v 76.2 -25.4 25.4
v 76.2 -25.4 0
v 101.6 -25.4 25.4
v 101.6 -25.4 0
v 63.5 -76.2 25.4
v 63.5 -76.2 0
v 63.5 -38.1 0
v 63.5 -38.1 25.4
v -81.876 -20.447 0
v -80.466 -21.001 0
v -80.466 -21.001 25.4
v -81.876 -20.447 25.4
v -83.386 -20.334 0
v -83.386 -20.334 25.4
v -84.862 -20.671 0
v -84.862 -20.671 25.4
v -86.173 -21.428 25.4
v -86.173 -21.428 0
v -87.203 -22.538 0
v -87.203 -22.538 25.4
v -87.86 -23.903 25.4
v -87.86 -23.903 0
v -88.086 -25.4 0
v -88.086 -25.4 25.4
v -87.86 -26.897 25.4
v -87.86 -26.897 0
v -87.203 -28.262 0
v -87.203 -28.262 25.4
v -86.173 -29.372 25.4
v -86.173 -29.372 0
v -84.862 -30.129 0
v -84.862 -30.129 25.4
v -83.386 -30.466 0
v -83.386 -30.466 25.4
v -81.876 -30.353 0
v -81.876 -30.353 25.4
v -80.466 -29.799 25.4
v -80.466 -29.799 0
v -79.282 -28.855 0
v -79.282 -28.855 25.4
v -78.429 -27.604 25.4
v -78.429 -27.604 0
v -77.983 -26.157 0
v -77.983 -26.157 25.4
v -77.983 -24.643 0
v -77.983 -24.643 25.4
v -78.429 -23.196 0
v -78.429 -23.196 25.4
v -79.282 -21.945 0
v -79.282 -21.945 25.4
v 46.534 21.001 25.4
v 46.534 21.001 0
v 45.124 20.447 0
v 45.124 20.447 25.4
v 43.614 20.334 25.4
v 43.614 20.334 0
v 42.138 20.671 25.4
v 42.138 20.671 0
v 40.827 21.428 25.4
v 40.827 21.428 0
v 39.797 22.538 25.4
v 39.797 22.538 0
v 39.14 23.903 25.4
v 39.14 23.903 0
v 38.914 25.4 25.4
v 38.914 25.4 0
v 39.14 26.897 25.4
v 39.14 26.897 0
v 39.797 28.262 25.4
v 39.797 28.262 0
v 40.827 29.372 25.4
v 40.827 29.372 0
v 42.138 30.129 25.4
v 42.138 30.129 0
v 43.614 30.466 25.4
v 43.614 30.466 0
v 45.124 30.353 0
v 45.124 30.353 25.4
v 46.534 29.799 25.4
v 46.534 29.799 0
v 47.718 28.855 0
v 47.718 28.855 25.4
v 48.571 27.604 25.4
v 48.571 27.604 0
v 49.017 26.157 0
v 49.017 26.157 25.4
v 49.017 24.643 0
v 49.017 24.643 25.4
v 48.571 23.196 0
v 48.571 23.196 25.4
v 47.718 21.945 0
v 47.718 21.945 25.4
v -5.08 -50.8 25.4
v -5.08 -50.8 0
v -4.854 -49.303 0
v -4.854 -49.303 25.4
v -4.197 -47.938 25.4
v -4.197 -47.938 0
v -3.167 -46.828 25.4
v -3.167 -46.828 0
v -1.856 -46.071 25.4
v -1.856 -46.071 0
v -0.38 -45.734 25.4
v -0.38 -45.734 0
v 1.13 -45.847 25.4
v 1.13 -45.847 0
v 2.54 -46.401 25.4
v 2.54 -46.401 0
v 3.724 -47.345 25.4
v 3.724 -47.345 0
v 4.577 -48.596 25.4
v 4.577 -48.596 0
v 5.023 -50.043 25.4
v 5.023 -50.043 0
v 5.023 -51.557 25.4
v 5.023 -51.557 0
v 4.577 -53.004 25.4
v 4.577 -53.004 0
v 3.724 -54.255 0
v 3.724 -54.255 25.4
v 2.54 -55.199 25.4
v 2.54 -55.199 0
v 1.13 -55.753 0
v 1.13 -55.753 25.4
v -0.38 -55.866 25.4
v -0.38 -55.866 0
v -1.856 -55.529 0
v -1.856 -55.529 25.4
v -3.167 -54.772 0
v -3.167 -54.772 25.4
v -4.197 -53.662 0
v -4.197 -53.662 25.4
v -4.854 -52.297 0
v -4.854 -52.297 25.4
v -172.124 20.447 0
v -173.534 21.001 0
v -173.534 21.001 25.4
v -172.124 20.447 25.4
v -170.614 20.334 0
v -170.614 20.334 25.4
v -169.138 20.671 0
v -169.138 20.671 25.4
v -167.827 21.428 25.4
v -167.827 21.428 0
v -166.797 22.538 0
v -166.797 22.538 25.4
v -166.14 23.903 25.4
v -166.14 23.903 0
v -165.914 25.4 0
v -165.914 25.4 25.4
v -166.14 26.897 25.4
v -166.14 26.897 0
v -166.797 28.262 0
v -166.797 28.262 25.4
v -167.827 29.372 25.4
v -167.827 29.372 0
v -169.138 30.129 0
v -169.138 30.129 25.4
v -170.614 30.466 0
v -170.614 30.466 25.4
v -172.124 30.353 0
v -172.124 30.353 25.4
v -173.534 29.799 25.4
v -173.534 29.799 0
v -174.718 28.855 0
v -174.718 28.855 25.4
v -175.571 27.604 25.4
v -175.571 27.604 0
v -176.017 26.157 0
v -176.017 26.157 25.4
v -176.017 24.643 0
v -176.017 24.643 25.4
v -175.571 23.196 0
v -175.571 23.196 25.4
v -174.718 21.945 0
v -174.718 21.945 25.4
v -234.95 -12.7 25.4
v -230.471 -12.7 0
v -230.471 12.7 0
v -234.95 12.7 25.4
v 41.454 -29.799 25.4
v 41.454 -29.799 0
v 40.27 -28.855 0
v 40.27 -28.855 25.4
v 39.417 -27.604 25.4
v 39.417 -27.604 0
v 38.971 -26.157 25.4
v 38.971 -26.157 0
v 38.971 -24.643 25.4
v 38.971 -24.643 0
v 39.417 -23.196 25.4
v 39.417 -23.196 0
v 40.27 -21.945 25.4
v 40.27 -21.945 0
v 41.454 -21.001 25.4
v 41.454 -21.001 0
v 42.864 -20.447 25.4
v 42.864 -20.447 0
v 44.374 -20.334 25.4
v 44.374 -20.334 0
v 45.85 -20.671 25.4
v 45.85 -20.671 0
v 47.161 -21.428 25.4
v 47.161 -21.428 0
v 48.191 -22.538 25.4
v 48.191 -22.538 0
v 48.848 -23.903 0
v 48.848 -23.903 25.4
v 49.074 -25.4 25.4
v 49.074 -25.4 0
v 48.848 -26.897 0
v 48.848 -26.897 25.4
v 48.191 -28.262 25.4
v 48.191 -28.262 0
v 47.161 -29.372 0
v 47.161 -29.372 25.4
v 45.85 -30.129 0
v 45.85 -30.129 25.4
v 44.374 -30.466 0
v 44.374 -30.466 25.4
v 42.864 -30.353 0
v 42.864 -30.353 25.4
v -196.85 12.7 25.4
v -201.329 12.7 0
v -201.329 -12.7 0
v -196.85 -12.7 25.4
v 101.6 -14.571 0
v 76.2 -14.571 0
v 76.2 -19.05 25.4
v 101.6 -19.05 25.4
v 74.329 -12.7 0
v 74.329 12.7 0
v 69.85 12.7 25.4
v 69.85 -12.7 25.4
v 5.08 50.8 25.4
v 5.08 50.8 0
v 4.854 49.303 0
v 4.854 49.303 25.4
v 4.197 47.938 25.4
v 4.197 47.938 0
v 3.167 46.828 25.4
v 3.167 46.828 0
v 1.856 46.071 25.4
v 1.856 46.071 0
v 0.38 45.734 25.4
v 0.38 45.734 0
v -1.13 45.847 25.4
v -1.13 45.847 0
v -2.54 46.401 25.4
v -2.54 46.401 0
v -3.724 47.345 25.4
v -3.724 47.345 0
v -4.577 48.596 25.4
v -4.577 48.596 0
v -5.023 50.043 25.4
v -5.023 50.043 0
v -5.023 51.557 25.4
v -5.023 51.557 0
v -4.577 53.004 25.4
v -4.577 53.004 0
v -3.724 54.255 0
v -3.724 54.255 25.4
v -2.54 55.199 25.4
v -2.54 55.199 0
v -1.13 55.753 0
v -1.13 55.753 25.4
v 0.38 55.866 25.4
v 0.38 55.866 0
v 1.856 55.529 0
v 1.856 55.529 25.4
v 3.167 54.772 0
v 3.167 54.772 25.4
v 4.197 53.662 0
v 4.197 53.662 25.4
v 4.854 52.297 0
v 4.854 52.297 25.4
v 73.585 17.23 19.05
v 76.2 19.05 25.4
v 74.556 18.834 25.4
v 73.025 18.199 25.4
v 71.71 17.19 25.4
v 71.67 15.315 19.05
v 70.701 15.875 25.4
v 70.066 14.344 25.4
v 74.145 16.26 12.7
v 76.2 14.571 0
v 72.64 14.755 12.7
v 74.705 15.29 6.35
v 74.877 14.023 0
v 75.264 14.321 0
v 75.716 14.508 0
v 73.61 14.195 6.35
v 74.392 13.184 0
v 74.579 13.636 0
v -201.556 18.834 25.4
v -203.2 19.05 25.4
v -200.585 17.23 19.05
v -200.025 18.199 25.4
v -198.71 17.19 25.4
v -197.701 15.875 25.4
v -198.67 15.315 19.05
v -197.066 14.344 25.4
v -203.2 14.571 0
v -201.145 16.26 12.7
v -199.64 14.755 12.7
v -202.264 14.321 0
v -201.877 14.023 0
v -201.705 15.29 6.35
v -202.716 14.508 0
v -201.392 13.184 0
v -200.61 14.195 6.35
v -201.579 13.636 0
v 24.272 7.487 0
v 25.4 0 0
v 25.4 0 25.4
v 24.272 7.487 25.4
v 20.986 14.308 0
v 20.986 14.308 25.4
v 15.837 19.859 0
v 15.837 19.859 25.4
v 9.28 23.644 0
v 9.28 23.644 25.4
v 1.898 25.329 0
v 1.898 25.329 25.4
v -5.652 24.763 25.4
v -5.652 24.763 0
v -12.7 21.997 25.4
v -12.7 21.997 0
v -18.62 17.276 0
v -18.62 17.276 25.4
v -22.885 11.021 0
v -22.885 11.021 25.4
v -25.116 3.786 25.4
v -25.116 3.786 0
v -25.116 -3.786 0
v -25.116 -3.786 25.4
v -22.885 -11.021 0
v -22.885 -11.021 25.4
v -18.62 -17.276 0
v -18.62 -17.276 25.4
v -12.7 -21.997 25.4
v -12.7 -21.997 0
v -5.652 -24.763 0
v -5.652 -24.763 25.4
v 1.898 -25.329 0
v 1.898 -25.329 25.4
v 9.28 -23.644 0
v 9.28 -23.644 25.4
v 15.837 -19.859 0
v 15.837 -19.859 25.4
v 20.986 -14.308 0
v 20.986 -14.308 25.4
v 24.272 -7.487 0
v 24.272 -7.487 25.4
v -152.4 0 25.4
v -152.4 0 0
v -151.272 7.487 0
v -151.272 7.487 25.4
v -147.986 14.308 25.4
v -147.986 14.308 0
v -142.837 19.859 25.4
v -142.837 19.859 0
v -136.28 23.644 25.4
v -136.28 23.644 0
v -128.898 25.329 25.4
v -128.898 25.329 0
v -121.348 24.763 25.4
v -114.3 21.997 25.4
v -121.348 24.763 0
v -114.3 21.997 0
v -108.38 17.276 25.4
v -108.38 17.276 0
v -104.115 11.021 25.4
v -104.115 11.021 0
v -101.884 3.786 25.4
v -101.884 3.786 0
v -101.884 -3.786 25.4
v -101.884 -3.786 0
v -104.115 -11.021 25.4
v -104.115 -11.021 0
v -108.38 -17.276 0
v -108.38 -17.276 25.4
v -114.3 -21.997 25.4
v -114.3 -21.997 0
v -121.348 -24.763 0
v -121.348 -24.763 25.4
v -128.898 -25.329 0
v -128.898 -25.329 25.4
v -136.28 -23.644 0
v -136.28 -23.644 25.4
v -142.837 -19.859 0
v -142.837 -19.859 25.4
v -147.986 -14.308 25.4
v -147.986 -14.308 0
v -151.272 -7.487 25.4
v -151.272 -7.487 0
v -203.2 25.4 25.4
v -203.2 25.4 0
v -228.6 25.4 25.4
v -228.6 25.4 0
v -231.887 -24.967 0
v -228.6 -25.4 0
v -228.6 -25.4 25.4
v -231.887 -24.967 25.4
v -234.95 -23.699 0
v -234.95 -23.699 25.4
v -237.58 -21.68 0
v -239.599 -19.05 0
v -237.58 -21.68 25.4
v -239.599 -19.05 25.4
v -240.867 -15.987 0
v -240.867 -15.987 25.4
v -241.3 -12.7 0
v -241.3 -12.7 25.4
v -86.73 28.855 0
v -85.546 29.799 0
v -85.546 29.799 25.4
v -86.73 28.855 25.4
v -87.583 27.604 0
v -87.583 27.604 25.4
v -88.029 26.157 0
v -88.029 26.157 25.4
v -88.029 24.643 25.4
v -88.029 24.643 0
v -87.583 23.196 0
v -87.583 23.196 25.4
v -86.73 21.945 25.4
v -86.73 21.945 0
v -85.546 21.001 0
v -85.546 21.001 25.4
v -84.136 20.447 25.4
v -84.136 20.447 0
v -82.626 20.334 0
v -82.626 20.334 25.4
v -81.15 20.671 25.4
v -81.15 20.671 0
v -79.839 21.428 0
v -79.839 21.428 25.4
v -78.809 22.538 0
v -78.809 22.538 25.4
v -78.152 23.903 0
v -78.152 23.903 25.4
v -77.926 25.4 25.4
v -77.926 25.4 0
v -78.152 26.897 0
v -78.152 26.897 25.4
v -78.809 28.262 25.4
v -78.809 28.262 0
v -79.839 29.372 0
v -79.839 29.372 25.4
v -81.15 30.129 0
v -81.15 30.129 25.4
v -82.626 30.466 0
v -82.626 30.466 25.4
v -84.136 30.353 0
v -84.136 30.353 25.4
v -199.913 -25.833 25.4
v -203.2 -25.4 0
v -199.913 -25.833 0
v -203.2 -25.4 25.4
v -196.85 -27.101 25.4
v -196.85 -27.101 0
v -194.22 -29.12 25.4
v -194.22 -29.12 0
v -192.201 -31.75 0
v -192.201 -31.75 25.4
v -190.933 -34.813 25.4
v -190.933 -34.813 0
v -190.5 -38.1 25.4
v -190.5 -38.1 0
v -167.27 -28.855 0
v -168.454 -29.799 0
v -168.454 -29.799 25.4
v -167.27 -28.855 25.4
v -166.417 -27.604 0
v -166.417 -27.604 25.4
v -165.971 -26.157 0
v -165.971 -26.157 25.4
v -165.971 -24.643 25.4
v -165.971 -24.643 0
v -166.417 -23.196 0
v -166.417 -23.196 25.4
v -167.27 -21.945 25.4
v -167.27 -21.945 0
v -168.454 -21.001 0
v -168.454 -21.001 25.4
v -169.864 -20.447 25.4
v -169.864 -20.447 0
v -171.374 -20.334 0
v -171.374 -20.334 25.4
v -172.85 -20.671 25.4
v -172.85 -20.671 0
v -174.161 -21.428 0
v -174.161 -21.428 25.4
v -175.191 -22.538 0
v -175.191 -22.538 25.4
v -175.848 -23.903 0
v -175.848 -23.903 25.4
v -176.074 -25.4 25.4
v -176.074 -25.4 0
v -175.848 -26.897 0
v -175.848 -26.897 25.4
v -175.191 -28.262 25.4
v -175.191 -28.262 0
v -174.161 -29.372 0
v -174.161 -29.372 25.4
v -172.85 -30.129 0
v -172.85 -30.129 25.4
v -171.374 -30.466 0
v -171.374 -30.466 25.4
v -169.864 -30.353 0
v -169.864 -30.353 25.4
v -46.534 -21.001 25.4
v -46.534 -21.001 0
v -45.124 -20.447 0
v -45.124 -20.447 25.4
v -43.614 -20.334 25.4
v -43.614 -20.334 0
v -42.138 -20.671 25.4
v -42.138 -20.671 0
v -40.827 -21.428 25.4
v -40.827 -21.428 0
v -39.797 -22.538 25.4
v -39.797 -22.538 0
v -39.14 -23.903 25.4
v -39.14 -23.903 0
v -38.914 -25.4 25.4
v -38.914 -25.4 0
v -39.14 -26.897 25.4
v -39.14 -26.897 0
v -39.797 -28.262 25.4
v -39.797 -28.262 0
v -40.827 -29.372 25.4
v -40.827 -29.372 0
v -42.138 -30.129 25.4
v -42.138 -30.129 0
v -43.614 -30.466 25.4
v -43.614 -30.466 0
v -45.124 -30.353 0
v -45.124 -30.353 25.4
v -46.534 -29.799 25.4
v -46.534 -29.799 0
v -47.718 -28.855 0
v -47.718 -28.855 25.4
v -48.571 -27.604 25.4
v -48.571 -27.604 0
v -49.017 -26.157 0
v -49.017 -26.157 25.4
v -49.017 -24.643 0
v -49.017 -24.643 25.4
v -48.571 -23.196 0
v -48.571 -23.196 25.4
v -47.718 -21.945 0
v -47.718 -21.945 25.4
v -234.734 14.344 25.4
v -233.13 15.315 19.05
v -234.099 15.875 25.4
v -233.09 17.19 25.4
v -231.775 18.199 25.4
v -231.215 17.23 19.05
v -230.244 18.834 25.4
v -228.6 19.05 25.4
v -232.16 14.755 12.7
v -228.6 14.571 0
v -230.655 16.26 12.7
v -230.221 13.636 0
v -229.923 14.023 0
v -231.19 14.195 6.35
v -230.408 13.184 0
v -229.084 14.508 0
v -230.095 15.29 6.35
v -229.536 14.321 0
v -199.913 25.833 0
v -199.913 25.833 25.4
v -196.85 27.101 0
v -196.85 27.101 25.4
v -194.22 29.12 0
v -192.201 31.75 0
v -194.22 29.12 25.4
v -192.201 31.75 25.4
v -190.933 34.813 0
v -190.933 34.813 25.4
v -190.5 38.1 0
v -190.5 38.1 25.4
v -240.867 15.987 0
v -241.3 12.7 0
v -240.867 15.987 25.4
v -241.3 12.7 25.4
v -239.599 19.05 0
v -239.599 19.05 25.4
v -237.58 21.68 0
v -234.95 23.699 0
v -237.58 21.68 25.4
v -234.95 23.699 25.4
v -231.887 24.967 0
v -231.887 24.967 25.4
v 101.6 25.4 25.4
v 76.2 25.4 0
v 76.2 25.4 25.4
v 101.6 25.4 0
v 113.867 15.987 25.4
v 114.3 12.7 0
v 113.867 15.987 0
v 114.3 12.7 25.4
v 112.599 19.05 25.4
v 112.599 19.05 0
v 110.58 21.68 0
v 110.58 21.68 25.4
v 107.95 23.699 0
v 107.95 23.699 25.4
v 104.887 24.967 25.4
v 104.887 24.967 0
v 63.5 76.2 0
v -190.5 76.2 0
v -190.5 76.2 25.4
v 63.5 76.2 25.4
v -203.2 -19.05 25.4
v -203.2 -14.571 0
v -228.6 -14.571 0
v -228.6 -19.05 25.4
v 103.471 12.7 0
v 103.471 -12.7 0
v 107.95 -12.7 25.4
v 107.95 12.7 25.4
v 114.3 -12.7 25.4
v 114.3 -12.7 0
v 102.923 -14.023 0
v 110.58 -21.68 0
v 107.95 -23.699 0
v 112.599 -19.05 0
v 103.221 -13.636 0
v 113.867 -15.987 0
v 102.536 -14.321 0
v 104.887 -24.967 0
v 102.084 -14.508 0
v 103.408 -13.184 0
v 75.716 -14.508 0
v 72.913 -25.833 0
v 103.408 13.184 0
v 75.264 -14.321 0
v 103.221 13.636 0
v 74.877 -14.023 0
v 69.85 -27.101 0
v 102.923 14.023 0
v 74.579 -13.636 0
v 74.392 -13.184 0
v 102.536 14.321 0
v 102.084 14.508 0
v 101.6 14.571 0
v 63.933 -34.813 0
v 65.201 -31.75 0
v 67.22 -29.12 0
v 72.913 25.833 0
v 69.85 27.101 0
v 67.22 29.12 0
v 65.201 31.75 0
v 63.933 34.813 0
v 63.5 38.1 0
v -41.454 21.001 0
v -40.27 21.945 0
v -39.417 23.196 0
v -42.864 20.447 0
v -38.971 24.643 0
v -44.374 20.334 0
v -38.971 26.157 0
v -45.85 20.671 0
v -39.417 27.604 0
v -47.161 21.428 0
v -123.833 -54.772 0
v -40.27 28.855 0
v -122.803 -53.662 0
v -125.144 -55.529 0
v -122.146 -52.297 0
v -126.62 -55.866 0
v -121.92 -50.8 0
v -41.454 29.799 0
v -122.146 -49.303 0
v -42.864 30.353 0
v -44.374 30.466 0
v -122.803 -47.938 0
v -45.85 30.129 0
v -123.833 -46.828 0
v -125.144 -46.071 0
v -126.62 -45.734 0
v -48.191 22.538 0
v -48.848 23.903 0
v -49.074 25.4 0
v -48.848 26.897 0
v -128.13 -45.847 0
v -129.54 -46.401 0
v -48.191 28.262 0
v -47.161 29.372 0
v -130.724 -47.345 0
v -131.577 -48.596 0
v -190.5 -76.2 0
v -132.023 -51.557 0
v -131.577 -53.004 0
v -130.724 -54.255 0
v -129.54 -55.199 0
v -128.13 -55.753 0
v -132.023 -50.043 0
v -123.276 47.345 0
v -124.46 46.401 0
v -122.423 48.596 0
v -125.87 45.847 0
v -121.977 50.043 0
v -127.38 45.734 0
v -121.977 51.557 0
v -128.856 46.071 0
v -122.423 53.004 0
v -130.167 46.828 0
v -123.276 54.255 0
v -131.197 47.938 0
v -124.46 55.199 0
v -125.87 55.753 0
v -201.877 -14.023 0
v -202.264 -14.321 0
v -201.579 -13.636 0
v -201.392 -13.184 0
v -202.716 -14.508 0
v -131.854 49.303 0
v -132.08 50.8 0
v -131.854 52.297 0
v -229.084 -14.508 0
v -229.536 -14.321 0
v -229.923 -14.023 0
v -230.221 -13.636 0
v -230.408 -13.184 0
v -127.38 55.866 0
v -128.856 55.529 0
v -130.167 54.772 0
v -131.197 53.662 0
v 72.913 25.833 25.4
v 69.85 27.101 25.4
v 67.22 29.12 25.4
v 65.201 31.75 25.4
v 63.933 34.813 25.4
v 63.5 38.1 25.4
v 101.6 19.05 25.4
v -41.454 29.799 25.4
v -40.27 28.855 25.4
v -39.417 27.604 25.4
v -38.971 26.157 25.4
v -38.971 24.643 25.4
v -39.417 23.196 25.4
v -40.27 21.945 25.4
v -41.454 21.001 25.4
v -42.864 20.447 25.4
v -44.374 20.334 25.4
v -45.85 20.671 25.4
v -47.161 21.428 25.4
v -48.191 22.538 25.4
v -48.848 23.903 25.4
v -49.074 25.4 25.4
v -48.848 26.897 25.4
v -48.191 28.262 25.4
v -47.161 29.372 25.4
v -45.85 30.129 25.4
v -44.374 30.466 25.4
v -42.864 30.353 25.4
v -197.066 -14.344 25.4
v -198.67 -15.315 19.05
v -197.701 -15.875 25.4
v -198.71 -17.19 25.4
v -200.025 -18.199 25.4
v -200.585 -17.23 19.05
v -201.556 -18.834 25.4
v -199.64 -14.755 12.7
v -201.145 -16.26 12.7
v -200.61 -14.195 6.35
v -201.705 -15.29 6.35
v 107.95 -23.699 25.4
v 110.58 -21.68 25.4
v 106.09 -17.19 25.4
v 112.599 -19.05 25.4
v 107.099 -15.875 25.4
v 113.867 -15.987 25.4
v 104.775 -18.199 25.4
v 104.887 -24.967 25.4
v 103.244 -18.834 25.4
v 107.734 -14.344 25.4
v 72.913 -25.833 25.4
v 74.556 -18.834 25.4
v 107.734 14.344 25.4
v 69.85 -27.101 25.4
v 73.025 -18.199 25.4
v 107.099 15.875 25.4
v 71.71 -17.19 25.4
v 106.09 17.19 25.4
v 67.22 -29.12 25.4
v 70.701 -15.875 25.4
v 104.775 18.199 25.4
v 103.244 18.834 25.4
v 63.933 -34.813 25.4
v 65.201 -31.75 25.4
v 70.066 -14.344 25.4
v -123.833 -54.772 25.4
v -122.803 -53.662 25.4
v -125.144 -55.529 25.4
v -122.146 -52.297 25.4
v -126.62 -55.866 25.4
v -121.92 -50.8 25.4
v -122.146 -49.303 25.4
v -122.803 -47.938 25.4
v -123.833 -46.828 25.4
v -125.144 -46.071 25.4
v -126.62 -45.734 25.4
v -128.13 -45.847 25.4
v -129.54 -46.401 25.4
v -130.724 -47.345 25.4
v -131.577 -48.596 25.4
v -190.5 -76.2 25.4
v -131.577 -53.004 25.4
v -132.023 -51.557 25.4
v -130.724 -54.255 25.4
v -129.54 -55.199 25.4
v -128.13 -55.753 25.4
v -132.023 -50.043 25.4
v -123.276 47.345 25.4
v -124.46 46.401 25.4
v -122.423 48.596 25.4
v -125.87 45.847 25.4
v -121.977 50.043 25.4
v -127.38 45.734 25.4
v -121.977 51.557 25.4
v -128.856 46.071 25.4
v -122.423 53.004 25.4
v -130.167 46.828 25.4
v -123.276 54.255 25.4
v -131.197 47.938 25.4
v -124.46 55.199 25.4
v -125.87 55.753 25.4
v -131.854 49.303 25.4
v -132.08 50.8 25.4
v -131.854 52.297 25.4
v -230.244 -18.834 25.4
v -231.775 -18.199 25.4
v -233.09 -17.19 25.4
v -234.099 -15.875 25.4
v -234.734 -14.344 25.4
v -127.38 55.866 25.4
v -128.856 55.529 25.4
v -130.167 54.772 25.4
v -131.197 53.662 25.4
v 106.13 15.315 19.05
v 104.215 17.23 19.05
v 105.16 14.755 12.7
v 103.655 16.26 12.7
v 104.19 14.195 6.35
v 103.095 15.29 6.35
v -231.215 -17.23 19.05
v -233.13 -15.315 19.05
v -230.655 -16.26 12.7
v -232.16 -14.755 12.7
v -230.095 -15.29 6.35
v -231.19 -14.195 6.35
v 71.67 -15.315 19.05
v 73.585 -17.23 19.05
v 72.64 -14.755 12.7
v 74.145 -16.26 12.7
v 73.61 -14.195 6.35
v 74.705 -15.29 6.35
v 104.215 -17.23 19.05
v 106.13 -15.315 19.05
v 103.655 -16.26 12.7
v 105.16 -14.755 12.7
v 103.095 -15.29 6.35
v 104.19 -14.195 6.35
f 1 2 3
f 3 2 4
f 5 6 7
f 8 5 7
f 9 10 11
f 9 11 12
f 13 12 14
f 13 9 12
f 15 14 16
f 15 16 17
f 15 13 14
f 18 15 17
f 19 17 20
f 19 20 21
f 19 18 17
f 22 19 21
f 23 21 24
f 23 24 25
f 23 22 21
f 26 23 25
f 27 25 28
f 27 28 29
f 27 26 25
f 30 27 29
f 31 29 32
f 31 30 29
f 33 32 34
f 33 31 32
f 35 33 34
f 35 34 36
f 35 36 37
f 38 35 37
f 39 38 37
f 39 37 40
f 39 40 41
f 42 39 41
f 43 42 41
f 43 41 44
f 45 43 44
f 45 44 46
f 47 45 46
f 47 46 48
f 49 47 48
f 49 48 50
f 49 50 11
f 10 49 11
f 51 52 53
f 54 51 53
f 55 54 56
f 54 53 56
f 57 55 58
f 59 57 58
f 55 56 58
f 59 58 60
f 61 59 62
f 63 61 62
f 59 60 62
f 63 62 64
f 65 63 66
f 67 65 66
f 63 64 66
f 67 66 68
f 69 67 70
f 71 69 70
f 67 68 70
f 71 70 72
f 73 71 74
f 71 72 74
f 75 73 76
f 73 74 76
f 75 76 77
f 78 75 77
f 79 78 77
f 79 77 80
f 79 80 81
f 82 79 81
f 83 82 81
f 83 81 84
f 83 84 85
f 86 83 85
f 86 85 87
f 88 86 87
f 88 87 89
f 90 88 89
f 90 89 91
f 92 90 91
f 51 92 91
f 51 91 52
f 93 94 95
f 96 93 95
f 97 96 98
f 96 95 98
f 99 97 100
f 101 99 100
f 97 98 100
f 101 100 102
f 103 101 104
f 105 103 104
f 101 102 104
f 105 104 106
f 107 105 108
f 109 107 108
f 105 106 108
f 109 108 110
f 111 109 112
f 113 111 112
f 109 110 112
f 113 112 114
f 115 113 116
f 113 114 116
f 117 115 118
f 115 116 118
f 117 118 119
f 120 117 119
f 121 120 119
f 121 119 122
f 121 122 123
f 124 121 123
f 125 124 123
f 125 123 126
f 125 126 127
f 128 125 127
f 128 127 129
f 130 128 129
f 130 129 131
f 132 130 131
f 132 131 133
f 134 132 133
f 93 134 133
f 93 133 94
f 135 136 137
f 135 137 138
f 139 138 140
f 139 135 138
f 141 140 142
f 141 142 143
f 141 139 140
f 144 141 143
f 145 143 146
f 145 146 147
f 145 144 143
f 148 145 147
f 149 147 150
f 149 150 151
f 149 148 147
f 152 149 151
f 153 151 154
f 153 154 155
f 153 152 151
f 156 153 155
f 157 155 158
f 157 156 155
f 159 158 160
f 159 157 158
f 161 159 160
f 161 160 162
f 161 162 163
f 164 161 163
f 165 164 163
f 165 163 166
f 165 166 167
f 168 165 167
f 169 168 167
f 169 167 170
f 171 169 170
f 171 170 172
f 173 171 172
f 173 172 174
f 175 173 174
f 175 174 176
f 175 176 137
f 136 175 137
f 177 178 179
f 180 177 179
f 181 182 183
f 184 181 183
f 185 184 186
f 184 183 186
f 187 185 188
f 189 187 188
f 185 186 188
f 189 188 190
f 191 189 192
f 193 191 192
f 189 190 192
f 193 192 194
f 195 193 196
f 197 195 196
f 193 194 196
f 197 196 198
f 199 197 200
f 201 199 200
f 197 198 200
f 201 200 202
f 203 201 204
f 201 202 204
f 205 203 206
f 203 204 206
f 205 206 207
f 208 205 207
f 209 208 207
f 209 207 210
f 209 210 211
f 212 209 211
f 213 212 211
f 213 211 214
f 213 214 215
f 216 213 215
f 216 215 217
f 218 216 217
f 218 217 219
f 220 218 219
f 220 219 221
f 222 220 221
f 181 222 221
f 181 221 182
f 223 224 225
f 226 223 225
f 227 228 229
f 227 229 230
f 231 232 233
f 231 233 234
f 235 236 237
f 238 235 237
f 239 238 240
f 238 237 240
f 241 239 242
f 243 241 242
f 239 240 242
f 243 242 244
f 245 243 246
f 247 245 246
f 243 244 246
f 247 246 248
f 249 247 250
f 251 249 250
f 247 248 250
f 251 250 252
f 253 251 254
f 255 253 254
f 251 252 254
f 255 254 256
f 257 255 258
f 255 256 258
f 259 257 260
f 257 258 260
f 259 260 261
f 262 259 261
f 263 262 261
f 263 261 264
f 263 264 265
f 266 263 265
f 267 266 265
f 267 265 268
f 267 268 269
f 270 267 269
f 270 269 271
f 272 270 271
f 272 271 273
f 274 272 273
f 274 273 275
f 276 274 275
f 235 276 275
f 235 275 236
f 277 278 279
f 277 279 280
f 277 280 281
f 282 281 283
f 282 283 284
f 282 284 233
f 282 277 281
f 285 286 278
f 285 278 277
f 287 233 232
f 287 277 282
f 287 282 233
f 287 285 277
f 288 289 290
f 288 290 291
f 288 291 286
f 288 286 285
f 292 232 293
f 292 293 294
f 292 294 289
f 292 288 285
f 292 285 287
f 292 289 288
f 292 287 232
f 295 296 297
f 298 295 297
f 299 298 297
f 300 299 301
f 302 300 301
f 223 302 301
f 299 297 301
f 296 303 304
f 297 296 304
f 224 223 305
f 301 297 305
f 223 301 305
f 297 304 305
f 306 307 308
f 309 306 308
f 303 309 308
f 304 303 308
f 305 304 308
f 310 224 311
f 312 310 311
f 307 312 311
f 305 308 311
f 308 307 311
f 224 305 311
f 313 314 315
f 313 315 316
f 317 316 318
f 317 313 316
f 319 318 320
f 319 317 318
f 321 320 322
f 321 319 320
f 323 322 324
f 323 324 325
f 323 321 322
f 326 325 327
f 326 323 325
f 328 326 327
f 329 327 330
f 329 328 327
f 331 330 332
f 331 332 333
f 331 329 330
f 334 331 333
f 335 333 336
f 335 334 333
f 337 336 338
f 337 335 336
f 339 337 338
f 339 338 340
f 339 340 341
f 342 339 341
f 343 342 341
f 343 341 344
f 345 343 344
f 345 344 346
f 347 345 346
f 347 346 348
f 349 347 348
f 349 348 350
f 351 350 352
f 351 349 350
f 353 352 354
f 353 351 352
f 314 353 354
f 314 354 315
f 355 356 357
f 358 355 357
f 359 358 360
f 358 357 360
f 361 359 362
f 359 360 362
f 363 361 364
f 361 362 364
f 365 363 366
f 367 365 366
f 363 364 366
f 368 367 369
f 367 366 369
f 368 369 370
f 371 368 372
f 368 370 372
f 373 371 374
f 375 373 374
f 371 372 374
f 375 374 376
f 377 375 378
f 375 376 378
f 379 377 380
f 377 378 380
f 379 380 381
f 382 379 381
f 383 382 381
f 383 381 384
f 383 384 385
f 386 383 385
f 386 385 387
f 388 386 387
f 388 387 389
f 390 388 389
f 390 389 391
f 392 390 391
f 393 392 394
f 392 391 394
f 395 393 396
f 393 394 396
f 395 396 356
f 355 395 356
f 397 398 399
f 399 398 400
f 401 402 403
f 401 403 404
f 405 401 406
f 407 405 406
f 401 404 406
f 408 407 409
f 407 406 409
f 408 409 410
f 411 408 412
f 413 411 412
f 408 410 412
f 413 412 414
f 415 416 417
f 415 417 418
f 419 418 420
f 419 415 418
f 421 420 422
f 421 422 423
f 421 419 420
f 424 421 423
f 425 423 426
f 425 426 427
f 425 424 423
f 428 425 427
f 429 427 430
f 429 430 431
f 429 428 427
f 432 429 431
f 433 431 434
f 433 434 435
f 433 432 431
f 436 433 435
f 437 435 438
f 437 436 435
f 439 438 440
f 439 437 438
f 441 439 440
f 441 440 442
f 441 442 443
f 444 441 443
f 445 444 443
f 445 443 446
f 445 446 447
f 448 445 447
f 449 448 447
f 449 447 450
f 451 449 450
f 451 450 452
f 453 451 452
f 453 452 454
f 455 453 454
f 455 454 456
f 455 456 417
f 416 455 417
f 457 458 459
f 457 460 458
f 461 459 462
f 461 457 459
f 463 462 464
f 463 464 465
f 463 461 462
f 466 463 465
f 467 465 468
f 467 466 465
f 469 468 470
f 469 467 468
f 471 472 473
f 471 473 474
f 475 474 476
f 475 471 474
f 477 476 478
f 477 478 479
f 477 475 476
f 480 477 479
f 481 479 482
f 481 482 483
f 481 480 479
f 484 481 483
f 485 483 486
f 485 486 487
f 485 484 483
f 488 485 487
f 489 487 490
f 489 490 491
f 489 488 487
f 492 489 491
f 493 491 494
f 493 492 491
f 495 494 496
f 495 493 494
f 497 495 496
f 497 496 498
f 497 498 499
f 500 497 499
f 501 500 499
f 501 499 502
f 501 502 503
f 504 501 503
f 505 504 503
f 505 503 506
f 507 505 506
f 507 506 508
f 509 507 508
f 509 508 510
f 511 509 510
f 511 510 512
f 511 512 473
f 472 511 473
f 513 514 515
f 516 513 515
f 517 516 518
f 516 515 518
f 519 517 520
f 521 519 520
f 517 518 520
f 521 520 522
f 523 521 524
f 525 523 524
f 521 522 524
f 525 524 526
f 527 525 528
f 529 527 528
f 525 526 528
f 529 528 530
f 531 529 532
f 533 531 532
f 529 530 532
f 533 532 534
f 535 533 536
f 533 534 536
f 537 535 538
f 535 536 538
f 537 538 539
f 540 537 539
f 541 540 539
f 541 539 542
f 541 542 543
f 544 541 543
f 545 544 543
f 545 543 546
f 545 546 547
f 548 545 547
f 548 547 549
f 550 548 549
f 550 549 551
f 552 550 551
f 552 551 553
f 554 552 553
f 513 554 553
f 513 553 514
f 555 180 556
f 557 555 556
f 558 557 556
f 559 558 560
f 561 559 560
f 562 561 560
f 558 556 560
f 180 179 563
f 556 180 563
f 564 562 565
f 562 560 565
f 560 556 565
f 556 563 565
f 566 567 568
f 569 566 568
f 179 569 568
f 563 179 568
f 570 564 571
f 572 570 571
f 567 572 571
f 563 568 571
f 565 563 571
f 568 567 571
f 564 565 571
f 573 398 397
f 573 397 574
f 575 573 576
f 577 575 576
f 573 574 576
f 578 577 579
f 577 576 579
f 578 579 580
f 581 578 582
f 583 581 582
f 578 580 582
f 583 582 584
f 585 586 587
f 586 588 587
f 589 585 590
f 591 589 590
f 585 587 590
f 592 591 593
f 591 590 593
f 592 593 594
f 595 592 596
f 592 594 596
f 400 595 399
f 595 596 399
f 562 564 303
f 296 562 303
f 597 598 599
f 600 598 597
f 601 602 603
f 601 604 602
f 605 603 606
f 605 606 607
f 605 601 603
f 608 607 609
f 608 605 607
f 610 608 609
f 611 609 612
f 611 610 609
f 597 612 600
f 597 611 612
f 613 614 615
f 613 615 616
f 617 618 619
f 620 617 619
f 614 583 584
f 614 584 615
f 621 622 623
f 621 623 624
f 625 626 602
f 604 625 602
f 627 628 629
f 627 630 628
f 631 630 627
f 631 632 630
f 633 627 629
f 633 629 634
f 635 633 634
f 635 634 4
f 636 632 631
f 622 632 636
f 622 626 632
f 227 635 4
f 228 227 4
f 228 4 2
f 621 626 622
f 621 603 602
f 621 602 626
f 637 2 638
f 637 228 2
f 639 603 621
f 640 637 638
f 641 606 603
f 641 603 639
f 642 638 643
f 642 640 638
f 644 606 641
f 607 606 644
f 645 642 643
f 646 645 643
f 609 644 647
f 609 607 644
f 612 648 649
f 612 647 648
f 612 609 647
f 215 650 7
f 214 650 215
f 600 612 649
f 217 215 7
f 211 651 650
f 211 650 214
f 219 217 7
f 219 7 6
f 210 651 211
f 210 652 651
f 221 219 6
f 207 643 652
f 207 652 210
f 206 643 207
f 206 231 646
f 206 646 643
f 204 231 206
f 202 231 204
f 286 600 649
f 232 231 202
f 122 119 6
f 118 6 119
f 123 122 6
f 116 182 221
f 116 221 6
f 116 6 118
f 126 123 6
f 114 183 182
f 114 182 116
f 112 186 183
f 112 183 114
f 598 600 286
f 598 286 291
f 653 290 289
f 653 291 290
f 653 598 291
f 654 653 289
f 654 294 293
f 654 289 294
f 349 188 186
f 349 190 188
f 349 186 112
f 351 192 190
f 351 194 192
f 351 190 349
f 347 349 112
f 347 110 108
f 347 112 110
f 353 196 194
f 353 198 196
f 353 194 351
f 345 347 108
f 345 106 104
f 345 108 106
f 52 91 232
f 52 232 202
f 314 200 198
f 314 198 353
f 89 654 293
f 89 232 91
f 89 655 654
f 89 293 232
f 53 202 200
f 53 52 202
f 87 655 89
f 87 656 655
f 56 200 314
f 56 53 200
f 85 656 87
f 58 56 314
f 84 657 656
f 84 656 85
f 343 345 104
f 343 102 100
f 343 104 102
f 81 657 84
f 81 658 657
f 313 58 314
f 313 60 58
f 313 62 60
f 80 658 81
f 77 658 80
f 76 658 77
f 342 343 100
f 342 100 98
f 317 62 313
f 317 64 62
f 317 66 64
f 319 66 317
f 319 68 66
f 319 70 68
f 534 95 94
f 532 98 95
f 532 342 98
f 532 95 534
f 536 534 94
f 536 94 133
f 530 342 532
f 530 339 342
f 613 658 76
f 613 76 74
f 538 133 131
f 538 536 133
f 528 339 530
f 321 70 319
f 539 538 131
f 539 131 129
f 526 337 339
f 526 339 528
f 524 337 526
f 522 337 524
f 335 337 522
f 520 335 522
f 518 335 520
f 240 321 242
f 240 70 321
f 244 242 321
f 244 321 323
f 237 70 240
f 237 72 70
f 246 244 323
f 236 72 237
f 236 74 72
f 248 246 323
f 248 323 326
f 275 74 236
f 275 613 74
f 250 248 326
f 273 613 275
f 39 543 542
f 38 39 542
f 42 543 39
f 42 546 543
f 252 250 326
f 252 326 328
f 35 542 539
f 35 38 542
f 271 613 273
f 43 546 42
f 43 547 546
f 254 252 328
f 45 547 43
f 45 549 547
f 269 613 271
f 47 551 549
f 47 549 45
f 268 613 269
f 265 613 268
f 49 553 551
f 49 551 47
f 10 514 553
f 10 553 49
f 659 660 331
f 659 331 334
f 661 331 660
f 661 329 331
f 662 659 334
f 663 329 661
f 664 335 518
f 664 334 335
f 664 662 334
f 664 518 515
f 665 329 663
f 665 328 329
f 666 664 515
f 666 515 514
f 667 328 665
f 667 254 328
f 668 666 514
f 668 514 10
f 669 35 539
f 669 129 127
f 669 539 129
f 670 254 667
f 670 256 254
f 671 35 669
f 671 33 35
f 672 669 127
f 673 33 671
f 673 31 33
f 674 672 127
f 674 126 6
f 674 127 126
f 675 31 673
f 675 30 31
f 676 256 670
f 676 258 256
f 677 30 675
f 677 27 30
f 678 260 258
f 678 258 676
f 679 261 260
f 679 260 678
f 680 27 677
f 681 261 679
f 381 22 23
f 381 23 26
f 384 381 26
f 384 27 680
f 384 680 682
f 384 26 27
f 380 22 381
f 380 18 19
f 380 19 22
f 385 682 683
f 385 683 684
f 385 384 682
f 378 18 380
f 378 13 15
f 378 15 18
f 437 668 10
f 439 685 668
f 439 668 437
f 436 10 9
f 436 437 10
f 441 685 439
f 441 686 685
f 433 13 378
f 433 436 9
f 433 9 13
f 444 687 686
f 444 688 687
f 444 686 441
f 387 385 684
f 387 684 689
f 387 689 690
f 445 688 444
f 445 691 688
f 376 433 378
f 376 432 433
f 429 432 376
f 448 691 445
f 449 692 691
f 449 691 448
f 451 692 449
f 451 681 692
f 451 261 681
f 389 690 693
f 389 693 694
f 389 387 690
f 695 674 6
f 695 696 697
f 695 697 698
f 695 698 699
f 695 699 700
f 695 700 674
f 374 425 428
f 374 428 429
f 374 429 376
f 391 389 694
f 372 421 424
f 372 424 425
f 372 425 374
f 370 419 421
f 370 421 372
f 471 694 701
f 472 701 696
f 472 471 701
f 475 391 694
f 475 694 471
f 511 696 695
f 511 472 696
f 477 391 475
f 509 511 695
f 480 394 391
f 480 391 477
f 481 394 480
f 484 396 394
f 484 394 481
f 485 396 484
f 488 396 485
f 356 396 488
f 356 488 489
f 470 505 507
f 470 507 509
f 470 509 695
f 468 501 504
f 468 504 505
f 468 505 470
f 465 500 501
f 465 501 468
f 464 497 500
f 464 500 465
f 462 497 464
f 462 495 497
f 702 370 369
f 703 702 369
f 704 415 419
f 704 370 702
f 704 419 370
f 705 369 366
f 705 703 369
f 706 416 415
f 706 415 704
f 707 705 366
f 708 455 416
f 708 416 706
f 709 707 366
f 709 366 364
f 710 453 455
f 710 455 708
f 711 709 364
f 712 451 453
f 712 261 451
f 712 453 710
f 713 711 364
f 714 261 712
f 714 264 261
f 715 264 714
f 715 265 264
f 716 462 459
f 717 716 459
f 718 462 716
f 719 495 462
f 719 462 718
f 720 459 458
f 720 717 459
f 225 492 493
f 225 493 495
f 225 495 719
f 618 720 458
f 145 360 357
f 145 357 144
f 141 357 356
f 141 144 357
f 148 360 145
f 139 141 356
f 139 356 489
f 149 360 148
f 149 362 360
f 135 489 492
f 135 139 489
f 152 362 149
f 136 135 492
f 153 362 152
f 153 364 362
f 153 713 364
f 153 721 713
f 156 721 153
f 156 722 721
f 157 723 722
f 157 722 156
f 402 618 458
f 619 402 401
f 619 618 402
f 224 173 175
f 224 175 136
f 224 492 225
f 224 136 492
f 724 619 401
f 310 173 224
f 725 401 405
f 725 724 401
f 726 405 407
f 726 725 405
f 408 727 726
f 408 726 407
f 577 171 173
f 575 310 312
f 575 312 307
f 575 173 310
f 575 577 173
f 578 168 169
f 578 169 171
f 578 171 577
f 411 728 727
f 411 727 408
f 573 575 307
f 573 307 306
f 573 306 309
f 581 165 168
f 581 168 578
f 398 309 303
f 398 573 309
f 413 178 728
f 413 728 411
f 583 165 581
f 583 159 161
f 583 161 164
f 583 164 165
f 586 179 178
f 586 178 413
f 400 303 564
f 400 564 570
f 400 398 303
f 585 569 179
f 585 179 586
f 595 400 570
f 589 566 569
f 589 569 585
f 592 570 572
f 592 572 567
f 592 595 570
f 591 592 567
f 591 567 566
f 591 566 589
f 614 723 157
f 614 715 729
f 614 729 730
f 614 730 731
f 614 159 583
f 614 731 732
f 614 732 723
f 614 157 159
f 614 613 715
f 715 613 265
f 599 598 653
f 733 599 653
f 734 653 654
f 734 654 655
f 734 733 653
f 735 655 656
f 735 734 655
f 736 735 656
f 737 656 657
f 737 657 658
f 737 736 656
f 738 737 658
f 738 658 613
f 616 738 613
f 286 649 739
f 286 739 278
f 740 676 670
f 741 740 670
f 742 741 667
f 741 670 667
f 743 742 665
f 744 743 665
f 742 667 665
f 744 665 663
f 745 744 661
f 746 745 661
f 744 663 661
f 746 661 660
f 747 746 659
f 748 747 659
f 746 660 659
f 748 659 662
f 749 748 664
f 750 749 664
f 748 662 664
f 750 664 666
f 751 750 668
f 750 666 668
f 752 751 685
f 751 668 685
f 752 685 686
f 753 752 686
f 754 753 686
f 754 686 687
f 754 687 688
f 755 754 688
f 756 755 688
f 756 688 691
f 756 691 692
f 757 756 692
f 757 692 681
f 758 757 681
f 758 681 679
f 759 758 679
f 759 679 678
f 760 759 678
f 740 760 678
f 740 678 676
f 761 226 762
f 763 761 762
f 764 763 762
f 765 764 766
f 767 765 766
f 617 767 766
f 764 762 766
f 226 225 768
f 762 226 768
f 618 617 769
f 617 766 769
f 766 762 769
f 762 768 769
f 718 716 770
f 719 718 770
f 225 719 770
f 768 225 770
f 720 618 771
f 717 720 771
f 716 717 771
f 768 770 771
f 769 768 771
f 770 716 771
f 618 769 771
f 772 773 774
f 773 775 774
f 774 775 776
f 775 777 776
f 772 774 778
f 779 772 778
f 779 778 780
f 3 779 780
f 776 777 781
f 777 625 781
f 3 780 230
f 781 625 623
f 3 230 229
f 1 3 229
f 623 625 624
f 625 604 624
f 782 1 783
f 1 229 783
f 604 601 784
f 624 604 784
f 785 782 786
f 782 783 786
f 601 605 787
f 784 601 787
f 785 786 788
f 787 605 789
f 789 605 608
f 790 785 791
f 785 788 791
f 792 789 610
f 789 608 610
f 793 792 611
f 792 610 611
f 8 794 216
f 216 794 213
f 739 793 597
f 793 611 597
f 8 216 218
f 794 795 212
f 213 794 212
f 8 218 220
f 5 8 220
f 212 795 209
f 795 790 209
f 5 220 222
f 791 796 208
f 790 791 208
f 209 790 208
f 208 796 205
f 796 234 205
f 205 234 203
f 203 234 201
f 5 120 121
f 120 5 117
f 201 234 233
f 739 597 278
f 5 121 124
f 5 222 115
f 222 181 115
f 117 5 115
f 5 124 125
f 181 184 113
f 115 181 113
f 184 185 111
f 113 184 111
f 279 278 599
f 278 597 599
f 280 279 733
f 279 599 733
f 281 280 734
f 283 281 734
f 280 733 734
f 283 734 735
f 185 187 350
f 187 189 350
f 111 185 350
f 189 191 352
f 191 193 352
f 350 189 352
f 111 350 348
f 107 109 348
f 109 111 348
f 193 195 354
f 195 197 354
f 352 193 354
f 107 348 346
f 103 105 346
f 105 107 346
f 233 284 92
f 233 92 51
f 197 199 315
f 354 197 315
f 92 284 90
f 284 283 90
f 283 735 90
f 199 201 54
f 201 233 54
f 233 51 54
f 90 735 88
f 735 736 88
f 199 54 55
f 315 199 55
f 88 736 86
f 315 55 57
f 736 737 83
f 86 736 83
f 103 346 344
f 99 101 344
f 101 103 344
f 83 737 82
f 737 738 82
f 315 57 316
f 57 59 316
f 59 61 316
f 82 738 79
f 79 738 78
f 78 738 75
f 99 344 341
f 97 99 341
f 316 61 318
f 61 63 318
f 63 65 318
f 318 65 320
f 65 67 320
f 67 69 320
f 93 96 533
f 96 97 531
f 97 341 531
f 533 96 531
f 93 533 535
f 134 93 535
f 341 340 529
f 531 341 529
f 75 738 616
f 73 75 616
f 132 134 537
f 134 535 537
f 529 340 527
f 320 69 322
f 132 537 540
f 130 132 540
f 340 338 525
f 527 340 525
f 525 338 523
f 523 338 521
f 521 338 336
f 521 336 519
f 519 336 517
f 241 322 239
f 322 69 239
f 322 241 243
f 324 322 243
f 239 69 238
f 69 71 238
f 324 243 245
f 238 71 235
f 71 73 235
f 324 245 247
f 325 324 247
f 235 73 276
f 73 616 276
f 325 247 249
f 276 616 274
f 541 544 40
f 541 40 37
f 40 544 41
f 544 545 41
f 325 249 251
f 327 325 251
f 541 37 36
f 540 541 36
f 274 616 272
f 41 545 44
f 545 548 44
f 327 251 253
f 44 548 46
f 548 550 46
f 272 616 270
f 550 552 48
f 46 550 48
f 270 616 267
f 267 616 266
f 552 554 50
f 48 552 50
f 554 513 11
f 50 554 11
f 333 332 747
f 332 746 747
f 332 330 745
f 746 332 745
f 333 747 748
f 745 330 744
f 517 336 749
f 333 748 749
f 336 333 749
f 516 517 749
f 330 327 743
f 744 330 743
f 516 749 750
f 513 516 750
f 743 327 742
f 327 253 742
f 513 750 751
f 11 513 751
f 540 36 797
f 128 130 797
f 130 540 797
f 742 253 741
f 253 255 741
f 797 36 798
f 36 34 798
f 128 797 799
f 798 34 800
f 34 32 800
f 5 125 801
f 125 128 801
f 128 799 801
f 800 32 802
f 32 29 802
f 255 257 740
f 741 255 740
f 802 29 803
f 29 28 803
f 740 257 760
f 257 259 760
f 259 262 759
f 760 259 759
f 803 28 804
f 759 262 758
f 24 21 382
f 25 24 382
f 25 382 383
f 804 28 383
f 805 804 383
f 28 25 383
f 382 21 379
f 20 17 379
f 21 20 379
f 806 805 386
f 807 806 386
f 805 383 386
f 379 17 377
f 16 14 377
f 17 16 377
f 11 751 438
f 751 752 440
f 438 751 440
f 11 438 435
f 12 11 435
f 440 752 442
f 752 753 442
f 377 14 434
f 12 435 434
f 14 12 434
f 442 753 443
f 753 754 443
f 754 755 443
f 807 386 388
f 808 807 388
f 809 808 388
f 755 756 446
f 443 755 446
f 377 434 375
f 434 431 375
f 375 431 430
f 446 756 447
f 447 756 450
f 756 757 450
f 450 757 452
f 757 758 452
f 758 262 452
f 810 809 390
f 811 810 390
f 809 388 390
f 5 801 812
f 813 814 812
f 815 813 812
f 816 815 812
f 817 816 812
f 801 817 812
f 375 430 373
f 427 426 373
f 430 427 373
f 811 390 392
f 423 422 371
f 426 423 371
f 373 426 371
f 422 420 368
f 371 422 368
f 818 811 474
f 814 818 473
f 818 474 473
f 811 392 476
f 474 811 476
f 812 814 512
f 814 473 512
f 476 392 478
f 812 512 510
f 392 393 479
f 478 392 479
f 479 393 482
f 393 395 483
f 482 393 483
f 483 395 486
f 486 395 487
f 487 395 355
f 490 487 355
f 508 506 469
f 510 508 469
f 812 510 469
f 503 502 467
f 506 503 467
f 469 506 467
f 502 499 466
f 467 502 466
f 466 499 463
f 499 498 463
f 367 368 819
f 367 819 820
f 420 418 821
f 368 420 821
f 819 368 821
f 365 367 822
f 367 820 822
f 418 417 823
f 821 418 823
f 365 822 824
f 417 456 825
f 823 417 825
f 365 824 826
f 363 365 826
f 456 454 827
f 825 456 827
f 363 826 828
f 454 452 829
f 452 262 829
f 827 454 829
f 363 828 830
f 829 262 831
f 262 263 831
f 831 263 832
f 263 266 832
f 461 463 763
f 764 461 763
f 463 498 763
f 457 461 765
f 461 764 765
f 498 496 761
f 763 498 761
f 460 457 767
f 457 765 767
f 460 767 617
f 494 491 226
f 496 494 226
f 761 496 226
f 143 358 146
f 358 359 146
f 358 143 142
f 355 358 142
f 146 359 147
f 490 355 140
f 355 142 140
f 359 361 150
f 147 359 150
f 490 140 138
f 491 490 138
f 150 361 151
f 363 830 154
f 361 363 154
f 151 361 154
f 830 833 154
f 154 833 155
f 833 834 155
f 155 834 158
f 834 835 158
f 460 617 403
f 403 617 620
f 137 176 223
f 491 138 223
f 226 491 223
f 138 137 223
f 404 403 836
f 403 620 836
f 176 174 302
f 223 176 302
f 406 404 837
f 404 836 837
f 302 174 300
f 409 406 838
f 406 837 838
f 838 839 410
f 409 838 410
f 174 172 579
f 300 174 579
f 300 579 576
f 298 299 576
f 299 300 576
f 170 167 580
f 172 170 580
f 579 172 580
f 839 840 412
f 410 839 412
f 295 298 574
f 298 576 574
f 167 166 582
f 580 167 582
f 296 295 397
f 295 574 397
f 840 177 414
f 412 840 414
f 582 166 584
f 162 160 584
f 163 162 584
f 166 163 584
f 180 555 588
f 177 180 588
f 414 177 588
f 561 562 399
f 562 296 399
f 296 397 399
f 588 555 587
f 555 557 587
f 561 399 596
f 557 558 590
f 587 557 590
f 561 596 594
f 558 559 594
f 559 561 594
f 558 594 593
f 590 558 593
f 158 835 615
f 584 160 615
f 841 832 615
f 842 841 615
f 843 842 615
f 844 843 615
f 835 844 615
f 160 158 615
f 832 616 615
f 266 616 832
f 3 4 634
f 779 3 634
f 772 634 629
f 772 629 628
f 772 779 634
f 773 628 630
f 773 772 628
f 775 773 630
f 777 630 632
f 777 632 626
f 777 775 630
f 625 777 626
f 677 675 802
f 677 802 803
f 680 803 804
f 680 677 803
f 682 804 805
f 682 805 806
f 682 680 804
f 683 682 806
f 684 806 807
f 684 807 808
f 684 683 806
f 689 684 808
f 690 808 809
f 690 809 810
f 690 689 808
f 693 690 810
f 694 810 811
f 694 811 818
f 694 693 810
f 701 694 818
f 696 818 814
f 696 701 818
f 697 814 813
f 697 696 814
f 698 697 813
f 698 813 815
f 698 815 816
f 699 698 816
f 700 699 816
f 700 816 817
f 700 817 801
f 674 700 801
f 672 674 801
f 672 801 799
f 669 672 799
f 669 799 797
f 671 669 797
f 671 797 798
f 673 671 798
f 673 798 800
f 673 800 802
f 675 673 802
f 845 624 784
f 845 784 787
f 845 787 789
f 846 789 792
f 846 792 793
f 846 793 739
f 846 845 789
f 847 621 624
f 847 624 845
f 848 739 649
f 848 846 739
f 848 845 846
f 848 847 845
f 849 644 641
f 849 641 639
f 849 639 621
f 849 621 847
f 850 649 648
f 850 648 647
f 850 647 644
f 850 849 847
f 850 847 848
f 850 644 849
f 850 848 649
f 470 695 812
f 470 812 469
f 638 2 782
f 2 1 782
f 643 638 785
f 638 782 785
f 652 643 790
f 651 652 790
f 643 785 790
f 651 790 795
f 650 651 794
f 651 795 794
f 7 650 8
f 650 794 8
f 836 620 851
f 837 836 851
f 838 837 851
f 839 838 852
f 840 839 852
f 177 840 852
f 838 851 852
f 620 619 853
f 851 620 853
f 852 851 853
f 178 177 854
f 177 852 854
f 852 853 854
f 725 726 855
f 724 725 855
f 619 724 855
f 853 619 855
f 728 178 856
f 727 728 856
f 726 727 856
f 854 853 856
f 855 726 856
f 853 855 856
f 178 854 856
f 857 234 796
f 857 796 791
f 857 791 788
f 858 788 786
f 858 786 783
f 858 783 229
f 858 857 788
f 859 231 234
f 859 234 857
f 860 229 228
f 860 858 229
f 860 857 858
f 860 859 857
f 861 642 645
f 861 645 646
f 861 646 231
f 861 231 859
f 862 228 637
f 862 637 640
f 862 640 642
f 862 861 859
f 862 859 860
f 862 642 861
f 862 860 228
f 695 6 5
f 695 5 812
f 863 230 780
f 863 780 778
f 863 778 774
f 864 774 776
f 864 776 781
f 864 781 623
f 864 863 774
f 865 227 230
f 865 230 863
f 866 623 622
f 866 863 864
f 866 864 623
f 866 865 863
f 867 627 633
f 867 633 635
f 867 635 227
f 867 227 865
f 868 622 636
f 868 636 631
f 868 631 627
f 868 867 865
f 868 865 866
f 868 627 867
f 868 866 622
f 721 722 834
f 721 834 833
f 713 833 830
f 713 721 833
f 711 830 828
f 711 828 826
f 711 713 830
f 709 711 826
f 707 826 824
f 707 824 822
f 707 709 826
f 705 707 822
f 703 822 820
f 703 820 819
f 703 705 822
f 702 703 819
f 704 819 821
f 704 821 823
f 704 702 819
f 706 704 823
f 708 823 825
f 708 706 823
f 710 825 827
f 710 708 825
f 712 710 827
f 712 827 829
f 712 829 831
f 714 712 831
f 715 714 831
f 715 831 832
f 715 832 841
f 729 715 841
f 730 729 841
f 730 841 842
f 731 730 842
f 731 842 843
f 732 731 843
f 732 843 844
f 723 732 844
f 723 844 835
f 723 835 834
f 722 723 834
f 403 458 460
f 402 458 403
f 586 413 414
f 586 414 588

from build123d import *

# Parameters (mm, degrees)
F0_W            = 50.8
F0_H            = 50.8
F0_R            = 25.4
F1_DEPTH        = 25.4
F2_R            = 12.7
F4_D            = 10.16
F4_COPIES_COUNT = 6
F5_DEPTH        = 25.401
F5_TAPER        = 10


# Not quite as in the source:
# - a pattern or mirror of a feature is missing from the dataset's text; its kind, count and spacing are read off the source's solid


with BuildPart() as f1:
    # F0 (on Top) → F1 (new body)
    with BuildSketch(Plane.XY):
        with Locations((88.9, 0)):
            Rectangle(F0_W, F0_H)
        Polygon((63.5, 25.4), (63.5, 76.2), (-63.5, 76.2), (-63.5, -76.2), (63.5, -76.2), (63.5, -25.4), align=None)
        Circle(F0_R, mode=Mode.SUBTRACT)
    extrude(amount=F1_DEPTH)

    # F2
    f2_edges = [f1.edges().sort_by_distance(p)[0] for p in [
        (63.5, -25.4, 12.7),
        (63.5, 25.4, 12.7),
        (114.3, -25.4, 12.7),
        (114.3, 25.4, 12.7),
    ]]
    fillet(f2_edges, radius=F2_R)

    # F4 (through all)
    with Locations(Plane.XY.offset(25.4)):
        with Locations((0, -50.8)):
            f4 = Hole(F4_D / 2)

    # F4_copies: F4 ×6 about axis
    f4_copies_axis = Axis((0, 0, 0), (0, 0, 1))
    for i in range(1, F4_COPIES_COUNT):
        add(f4.rotate(f4_copies_axis, i * 360 / F4_COPIES_COUNT), mode=Mode.SUBTRACT)

    # F3 (on face) → F5 (cut, through all)
    with BuildSketch(Plane.XY.offset(25.4)):
        with BuildLine():
            ThreePointArc((107.9500002354, 12.7), (106.090128227, 17.190128227), (101.6, 19.0500002354))
            Line((101.6, 19.0500002354), (76.2000002354, 19.0500002354))
            ThreePointArc((76.2000002354, 19.0500002354), (71.7098721749, 17.190128296), (69.8500002354, 12.7000002354))
            Line((69.8500002354, 12.7000002354), (69.8500002354, -12.7000002354))
            ThreePointArc((69.8500002354, -12.7000002354), (71.7098721749, -17.190128296), (76.2000002354, -19.0500002354))
            Line((76.2000002354, -19.0500002354), (101.6, -19.0500002354))
            ThreePointArc((101.6, -19.0500002354), (106.090128227, -17.190128227), (107.9500002354, -12.7))
            Line((107.9500002354, -12.7), (107.9500002354, 12.7))
        make_face()
    extrude(amount=-F5_DEPTH, taper=F5_TAPER, mode=Mode.SUBTRACT)

    # F6: F1 across face


with BuildPart() as f1_1:
    add(f1.part)
    add(f1.part.mirror(Plane(origin=(-63.5, 0, 12.7), x_dir=(0, -1, 0), z_dir=(-1, 0, 0))))


solid = f1_1.part
